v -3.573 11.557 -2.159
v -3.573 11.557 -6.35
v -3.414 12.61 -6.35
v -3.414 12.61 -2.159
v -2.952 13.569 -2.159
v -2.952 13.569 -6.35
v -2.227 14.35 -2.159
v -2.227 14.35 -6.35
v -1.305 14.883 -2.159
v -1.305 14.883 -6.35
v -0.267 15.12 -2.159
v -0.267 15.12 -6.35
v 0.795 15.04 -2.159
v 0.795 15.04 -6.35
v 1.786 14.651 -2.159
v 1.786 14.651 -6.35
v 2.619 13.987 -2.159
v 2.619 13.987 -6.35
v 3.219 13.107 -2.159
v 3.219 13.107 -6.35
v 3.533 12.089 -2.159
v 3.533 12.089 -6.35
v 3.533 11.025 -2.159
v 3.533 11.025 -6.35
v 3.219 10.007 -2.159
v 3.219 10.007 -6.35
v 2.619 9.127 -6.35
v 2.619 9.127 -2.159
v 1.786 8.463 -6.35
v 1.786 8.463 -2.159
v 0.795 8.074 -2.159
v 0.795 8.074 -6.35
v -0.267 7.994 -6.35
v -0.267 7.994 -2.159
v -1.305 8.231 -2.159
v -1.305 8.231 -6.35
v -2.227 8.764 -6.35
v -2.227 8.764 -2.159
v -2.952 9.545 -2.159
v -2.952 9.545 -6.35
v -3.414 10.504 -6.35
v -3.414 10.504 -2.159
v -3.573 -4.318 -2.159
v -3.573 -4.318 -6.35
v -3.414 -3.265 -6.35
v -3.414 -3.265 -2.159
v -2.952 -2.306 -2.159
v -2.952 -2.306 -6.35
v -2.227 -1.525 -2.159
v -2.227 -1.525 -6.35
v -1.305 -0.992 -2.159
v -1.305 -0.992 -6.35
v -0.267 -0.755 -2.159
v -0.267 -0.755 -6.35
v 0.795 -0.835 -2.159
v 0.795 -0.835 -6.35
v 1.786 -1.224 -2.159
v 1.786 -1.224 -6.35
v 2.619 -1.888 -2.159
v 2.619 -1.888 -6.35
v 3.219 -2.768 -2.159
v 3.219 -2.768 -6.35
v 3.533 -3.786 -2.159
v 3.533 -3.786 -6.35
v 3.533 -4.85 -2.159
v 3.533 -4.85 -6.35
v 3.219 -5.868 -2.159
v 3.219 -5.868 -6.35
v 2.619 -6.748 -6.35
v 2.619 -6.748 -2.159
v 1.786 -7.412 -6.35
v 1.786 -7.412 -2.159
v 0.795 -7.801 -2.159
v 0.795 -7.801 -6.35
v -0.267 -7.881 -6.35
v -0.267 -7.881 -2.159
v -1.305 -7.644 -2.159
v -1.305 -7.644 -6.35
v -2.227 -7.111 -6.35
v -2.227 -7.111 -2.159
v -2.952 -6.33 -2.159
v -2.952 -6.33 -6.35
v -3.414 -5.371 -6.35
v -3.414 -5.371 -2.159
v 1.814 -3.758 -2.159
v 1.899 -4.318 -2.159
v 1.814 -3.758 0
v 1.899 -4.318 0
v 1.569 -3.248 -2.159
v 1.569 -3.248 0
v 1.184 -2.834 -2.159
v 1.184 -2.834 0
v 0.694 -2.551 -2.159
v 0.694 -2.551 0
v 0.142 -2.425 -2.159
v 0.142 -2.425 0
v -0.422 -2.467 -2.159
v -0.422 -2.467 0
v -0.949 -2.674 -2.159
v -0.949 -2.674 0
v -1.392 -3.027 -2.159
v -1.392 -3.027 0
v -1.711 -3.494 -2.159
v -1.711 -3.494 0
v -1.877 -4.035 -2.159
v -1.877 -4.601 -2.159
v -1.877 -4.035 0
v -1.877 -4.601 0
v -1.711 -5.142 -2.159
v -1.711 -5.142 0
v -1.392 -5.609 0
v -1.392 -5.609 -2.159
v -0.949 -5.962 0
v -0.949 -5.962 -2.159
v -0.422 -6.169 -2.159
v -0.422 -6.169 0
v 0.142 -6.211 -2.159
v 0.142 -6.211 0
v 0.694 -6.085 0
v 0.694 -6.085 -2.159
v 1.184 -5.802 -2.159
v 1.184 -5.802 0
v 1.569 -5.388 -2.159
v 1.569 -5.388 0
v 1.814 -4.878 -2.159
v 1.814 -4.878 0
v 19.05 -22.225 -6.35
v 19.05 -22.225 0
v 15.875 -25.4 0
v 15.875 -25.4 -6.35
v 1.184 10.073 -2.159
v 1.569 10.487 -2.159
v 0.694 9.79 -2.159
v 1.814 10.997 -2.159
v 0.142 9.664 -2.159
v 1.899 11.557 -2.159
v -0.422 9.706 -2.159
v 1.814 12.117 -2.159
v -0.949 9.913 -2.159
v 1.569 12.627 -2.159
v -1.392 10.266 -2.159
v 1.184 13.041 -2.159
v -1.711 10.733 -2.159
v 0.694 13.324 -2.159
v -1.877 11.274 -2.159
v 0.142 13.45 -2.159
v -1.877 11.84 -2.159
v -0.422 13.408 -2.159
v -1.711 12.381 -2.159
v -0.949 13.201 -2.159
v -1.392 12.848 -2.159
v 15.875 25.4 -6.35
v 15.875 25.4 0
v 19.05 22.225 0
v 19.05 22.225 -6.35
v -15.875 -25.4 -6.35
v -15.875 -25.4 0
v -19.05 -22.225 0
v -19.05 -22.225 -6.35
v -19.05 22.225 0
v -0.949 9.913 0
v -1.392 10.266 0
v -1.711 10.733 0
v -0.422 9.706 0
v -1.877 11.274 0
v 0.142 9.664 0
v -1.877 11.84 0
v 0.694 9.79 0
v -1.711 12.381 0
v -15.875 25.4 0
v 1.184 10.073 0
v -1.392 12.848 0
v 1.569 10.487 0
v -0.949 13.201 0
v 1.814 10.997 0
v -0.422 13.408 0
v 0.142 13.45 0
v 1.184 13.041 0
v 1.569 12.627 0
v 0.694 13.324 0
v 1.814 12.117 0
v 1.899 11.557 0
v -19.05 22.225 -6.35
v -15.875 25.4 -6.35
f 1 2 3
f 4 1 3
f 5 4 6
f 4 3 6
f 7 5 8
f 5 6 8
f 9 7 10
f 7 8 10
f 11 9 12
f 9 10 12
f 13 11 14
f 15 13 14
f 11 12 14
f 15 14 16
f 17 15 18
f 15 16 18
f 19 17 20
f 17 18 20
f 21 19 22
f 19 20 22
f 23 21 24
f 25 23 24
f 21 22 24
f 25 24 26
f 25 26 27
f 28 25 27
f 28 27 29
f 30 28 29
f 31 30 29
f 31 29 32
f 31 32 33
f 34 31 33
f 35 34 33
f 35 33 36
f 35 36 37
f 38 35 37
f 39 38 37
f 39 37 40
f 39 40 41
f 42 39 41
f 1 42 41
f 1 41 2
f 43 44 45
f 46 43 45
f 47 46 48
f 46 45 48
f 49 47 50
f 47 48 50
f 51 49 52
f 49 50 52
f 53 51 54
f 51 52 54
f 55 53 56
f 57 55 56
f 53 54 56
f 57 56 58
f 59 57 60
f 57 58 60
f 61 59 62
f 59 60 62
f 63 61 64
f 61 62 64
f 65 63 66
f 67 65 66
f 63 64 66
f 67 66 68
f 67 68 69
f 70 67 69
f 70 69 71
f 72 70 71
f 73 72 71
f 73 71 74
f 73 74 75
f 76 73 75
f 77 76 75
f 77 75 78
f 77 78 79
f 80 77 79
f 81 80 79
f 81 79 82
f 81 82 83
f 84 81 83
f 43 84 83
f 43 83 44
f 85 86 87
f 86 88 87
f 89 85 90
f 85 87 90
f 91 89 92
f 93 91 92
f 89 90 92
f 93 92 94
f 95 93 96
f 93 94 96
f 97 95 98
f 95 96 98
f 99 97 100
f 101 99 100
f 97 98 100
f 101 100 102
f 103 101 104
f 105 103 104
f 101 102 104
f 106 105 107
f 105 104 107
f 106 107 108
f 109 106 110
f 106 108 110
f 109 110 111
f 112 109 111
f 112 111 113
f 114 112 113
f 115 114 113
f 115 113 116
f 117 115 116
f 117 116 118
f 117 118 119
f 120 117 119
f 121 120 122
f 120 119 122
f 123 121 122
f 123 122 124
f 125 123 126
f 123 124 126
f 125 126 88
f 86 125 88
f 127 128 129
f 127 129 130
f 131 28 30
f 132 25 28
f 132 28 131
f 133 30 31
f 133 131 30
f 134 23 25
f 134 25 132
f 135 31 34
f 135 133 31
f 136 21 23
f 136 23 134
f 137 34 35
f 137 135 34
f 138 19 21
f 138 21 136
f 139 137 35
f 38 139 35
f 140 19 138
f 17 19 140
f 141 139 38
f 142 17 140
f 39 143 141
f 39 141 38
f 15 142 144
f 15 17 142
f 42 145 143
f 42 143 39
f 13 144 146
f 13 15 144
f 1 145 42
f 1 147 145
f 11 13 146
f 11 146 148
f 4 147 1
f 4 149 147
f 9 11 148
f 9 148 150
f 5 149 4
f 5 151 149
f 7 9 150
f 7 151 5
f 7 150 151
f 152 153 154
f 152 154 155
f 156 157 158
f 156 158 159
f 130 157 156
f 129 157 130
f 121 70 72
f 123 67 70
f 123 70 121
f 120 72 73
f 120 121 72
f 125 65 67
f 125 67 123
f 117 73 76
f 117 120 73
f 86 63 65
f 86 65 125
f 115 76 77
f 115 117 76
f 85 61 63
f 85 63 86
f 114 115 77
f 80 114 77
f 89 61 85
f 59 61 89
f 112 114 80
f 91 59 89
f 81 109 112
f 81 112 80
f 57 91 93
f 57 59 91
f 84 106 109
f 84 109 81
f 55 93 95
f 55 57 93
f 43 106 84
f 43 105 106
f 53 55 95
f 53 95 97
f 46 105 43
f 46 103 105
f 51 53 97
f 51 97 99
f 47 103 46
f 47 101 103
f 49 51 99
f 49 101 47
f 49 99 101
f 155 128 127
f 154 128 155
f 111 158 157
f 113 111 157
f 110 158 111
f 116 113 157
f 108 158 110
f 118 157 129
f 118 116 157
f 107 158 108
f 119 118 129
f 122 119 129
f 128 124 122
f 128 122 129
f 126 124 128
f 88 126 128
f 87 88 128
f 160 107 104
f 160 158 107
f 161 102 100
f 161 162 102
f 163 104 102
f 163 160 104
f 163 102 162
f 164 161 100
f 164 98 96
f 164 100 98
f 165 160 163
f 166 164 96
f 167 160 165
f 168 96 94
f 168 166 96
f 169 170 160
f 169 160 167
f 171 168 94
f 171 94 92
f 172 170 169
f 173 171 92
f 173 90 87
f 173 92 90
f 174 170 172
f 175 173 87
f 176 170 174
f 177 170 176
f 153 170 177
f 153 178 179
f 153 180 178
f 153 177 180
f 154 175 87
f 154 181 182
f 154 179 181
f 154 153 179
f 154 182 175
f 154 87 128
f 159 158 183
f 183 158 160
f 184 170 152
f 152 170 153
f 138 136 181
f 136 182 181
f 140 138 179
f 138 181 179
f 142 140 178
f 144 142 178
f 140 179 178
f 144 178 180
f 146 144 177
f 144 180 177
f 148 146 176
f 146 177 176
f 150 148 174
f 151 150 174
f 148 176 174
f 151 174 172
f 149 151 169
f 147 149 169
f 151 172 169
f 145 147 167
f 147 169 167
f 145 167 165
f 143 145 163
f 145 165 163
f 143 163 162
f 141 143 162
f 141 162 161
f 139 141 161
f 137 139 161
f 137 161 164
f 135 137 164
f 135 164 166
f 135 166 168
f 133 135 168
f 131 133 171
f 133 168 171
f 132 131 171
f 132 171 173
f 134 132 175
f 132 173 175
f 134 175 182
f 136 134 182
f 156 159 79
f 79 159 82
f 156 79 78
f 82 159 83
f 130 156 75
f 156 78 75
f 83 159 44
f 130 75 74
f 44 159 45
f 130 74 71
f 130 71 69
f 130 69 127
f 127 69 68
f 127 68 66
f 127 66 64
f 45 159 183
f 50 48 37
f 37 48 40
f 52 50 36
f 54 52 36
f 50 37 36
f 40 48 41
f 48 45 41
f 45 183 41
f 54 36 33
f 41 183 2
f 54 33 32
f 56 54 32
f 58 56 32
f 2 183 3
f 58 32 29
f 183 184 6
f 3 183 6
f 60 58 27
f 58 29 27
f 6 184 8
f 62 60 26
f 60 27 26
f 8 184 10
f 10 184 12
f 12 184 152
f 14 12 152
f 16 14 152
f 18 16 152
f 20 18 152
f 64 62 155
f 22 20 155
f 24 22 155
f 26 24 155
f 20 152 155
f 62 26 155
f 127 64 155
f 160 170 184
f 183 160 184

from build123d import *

# Parameters (mm, degrees)
SKETCH1_W                                      = 38.1
SKETCH1_H                                      = 50.8
BOSS_EXTRUDE1_DEPTH                            = 6.35
CHAMFER1_SIZE                                  = 3.175
CBORE_FOR_6_SOCKET_HEAD_CAP_SCREW1_D           = 3.7973
CBORE_FOR_6_SOCKET_HEAD_CAP_SCREW1_CBORE_D     = 7.14502
CBORE_FOR_6_SOCKET_HEAD_CAP_SCREW1_CBORE_DEPTH = 4.191


with BuildPart() as part:
    # Sketch1 → Boss-Extrude1 (new body)
    with BuildSketch(Plane.XY):
        Rectangle(SKETCH1_W, SKETCH1_H)
    extrude(amount=-BOSS_EXTRUDE1_DEPTH)

    # Chamfer1
    chamfer1_edges = [part.edges().sort_by_distance(p)[0] for p in [
        (19.05, -25.4, -3.175),
        (-19.05, -25.4, -3.175),
        (-19.05, 25.4, -3.175),
        (19.05, 25.4, -3.175),
    ]]
    chamfer(chamfer1_edges, length=CHAMFER1_SIZE)

    # CBORE for #6 Socket Head Cap Screw1 (through all)
    with Locations(Plane(origin=(0, 0, -6.35), x_dir=(-1, 0, 0), z_dir=(0, 0, -1))):
        with Locations((0, -4.318), (0, 11.557)):
            CounterBoreHole(CBORE_FOR_6_SOCKET_HEAD_CAP_SCREW1_D / 2, CBORE_FOR_6_SOCKET_HEAD_CAP_SCREW1_CBORE_D / 2, CBORE_FOR_6_SOCKET_HEAD_CAP_SCREW1_CBORE_DEPTH)


solid = part.part
